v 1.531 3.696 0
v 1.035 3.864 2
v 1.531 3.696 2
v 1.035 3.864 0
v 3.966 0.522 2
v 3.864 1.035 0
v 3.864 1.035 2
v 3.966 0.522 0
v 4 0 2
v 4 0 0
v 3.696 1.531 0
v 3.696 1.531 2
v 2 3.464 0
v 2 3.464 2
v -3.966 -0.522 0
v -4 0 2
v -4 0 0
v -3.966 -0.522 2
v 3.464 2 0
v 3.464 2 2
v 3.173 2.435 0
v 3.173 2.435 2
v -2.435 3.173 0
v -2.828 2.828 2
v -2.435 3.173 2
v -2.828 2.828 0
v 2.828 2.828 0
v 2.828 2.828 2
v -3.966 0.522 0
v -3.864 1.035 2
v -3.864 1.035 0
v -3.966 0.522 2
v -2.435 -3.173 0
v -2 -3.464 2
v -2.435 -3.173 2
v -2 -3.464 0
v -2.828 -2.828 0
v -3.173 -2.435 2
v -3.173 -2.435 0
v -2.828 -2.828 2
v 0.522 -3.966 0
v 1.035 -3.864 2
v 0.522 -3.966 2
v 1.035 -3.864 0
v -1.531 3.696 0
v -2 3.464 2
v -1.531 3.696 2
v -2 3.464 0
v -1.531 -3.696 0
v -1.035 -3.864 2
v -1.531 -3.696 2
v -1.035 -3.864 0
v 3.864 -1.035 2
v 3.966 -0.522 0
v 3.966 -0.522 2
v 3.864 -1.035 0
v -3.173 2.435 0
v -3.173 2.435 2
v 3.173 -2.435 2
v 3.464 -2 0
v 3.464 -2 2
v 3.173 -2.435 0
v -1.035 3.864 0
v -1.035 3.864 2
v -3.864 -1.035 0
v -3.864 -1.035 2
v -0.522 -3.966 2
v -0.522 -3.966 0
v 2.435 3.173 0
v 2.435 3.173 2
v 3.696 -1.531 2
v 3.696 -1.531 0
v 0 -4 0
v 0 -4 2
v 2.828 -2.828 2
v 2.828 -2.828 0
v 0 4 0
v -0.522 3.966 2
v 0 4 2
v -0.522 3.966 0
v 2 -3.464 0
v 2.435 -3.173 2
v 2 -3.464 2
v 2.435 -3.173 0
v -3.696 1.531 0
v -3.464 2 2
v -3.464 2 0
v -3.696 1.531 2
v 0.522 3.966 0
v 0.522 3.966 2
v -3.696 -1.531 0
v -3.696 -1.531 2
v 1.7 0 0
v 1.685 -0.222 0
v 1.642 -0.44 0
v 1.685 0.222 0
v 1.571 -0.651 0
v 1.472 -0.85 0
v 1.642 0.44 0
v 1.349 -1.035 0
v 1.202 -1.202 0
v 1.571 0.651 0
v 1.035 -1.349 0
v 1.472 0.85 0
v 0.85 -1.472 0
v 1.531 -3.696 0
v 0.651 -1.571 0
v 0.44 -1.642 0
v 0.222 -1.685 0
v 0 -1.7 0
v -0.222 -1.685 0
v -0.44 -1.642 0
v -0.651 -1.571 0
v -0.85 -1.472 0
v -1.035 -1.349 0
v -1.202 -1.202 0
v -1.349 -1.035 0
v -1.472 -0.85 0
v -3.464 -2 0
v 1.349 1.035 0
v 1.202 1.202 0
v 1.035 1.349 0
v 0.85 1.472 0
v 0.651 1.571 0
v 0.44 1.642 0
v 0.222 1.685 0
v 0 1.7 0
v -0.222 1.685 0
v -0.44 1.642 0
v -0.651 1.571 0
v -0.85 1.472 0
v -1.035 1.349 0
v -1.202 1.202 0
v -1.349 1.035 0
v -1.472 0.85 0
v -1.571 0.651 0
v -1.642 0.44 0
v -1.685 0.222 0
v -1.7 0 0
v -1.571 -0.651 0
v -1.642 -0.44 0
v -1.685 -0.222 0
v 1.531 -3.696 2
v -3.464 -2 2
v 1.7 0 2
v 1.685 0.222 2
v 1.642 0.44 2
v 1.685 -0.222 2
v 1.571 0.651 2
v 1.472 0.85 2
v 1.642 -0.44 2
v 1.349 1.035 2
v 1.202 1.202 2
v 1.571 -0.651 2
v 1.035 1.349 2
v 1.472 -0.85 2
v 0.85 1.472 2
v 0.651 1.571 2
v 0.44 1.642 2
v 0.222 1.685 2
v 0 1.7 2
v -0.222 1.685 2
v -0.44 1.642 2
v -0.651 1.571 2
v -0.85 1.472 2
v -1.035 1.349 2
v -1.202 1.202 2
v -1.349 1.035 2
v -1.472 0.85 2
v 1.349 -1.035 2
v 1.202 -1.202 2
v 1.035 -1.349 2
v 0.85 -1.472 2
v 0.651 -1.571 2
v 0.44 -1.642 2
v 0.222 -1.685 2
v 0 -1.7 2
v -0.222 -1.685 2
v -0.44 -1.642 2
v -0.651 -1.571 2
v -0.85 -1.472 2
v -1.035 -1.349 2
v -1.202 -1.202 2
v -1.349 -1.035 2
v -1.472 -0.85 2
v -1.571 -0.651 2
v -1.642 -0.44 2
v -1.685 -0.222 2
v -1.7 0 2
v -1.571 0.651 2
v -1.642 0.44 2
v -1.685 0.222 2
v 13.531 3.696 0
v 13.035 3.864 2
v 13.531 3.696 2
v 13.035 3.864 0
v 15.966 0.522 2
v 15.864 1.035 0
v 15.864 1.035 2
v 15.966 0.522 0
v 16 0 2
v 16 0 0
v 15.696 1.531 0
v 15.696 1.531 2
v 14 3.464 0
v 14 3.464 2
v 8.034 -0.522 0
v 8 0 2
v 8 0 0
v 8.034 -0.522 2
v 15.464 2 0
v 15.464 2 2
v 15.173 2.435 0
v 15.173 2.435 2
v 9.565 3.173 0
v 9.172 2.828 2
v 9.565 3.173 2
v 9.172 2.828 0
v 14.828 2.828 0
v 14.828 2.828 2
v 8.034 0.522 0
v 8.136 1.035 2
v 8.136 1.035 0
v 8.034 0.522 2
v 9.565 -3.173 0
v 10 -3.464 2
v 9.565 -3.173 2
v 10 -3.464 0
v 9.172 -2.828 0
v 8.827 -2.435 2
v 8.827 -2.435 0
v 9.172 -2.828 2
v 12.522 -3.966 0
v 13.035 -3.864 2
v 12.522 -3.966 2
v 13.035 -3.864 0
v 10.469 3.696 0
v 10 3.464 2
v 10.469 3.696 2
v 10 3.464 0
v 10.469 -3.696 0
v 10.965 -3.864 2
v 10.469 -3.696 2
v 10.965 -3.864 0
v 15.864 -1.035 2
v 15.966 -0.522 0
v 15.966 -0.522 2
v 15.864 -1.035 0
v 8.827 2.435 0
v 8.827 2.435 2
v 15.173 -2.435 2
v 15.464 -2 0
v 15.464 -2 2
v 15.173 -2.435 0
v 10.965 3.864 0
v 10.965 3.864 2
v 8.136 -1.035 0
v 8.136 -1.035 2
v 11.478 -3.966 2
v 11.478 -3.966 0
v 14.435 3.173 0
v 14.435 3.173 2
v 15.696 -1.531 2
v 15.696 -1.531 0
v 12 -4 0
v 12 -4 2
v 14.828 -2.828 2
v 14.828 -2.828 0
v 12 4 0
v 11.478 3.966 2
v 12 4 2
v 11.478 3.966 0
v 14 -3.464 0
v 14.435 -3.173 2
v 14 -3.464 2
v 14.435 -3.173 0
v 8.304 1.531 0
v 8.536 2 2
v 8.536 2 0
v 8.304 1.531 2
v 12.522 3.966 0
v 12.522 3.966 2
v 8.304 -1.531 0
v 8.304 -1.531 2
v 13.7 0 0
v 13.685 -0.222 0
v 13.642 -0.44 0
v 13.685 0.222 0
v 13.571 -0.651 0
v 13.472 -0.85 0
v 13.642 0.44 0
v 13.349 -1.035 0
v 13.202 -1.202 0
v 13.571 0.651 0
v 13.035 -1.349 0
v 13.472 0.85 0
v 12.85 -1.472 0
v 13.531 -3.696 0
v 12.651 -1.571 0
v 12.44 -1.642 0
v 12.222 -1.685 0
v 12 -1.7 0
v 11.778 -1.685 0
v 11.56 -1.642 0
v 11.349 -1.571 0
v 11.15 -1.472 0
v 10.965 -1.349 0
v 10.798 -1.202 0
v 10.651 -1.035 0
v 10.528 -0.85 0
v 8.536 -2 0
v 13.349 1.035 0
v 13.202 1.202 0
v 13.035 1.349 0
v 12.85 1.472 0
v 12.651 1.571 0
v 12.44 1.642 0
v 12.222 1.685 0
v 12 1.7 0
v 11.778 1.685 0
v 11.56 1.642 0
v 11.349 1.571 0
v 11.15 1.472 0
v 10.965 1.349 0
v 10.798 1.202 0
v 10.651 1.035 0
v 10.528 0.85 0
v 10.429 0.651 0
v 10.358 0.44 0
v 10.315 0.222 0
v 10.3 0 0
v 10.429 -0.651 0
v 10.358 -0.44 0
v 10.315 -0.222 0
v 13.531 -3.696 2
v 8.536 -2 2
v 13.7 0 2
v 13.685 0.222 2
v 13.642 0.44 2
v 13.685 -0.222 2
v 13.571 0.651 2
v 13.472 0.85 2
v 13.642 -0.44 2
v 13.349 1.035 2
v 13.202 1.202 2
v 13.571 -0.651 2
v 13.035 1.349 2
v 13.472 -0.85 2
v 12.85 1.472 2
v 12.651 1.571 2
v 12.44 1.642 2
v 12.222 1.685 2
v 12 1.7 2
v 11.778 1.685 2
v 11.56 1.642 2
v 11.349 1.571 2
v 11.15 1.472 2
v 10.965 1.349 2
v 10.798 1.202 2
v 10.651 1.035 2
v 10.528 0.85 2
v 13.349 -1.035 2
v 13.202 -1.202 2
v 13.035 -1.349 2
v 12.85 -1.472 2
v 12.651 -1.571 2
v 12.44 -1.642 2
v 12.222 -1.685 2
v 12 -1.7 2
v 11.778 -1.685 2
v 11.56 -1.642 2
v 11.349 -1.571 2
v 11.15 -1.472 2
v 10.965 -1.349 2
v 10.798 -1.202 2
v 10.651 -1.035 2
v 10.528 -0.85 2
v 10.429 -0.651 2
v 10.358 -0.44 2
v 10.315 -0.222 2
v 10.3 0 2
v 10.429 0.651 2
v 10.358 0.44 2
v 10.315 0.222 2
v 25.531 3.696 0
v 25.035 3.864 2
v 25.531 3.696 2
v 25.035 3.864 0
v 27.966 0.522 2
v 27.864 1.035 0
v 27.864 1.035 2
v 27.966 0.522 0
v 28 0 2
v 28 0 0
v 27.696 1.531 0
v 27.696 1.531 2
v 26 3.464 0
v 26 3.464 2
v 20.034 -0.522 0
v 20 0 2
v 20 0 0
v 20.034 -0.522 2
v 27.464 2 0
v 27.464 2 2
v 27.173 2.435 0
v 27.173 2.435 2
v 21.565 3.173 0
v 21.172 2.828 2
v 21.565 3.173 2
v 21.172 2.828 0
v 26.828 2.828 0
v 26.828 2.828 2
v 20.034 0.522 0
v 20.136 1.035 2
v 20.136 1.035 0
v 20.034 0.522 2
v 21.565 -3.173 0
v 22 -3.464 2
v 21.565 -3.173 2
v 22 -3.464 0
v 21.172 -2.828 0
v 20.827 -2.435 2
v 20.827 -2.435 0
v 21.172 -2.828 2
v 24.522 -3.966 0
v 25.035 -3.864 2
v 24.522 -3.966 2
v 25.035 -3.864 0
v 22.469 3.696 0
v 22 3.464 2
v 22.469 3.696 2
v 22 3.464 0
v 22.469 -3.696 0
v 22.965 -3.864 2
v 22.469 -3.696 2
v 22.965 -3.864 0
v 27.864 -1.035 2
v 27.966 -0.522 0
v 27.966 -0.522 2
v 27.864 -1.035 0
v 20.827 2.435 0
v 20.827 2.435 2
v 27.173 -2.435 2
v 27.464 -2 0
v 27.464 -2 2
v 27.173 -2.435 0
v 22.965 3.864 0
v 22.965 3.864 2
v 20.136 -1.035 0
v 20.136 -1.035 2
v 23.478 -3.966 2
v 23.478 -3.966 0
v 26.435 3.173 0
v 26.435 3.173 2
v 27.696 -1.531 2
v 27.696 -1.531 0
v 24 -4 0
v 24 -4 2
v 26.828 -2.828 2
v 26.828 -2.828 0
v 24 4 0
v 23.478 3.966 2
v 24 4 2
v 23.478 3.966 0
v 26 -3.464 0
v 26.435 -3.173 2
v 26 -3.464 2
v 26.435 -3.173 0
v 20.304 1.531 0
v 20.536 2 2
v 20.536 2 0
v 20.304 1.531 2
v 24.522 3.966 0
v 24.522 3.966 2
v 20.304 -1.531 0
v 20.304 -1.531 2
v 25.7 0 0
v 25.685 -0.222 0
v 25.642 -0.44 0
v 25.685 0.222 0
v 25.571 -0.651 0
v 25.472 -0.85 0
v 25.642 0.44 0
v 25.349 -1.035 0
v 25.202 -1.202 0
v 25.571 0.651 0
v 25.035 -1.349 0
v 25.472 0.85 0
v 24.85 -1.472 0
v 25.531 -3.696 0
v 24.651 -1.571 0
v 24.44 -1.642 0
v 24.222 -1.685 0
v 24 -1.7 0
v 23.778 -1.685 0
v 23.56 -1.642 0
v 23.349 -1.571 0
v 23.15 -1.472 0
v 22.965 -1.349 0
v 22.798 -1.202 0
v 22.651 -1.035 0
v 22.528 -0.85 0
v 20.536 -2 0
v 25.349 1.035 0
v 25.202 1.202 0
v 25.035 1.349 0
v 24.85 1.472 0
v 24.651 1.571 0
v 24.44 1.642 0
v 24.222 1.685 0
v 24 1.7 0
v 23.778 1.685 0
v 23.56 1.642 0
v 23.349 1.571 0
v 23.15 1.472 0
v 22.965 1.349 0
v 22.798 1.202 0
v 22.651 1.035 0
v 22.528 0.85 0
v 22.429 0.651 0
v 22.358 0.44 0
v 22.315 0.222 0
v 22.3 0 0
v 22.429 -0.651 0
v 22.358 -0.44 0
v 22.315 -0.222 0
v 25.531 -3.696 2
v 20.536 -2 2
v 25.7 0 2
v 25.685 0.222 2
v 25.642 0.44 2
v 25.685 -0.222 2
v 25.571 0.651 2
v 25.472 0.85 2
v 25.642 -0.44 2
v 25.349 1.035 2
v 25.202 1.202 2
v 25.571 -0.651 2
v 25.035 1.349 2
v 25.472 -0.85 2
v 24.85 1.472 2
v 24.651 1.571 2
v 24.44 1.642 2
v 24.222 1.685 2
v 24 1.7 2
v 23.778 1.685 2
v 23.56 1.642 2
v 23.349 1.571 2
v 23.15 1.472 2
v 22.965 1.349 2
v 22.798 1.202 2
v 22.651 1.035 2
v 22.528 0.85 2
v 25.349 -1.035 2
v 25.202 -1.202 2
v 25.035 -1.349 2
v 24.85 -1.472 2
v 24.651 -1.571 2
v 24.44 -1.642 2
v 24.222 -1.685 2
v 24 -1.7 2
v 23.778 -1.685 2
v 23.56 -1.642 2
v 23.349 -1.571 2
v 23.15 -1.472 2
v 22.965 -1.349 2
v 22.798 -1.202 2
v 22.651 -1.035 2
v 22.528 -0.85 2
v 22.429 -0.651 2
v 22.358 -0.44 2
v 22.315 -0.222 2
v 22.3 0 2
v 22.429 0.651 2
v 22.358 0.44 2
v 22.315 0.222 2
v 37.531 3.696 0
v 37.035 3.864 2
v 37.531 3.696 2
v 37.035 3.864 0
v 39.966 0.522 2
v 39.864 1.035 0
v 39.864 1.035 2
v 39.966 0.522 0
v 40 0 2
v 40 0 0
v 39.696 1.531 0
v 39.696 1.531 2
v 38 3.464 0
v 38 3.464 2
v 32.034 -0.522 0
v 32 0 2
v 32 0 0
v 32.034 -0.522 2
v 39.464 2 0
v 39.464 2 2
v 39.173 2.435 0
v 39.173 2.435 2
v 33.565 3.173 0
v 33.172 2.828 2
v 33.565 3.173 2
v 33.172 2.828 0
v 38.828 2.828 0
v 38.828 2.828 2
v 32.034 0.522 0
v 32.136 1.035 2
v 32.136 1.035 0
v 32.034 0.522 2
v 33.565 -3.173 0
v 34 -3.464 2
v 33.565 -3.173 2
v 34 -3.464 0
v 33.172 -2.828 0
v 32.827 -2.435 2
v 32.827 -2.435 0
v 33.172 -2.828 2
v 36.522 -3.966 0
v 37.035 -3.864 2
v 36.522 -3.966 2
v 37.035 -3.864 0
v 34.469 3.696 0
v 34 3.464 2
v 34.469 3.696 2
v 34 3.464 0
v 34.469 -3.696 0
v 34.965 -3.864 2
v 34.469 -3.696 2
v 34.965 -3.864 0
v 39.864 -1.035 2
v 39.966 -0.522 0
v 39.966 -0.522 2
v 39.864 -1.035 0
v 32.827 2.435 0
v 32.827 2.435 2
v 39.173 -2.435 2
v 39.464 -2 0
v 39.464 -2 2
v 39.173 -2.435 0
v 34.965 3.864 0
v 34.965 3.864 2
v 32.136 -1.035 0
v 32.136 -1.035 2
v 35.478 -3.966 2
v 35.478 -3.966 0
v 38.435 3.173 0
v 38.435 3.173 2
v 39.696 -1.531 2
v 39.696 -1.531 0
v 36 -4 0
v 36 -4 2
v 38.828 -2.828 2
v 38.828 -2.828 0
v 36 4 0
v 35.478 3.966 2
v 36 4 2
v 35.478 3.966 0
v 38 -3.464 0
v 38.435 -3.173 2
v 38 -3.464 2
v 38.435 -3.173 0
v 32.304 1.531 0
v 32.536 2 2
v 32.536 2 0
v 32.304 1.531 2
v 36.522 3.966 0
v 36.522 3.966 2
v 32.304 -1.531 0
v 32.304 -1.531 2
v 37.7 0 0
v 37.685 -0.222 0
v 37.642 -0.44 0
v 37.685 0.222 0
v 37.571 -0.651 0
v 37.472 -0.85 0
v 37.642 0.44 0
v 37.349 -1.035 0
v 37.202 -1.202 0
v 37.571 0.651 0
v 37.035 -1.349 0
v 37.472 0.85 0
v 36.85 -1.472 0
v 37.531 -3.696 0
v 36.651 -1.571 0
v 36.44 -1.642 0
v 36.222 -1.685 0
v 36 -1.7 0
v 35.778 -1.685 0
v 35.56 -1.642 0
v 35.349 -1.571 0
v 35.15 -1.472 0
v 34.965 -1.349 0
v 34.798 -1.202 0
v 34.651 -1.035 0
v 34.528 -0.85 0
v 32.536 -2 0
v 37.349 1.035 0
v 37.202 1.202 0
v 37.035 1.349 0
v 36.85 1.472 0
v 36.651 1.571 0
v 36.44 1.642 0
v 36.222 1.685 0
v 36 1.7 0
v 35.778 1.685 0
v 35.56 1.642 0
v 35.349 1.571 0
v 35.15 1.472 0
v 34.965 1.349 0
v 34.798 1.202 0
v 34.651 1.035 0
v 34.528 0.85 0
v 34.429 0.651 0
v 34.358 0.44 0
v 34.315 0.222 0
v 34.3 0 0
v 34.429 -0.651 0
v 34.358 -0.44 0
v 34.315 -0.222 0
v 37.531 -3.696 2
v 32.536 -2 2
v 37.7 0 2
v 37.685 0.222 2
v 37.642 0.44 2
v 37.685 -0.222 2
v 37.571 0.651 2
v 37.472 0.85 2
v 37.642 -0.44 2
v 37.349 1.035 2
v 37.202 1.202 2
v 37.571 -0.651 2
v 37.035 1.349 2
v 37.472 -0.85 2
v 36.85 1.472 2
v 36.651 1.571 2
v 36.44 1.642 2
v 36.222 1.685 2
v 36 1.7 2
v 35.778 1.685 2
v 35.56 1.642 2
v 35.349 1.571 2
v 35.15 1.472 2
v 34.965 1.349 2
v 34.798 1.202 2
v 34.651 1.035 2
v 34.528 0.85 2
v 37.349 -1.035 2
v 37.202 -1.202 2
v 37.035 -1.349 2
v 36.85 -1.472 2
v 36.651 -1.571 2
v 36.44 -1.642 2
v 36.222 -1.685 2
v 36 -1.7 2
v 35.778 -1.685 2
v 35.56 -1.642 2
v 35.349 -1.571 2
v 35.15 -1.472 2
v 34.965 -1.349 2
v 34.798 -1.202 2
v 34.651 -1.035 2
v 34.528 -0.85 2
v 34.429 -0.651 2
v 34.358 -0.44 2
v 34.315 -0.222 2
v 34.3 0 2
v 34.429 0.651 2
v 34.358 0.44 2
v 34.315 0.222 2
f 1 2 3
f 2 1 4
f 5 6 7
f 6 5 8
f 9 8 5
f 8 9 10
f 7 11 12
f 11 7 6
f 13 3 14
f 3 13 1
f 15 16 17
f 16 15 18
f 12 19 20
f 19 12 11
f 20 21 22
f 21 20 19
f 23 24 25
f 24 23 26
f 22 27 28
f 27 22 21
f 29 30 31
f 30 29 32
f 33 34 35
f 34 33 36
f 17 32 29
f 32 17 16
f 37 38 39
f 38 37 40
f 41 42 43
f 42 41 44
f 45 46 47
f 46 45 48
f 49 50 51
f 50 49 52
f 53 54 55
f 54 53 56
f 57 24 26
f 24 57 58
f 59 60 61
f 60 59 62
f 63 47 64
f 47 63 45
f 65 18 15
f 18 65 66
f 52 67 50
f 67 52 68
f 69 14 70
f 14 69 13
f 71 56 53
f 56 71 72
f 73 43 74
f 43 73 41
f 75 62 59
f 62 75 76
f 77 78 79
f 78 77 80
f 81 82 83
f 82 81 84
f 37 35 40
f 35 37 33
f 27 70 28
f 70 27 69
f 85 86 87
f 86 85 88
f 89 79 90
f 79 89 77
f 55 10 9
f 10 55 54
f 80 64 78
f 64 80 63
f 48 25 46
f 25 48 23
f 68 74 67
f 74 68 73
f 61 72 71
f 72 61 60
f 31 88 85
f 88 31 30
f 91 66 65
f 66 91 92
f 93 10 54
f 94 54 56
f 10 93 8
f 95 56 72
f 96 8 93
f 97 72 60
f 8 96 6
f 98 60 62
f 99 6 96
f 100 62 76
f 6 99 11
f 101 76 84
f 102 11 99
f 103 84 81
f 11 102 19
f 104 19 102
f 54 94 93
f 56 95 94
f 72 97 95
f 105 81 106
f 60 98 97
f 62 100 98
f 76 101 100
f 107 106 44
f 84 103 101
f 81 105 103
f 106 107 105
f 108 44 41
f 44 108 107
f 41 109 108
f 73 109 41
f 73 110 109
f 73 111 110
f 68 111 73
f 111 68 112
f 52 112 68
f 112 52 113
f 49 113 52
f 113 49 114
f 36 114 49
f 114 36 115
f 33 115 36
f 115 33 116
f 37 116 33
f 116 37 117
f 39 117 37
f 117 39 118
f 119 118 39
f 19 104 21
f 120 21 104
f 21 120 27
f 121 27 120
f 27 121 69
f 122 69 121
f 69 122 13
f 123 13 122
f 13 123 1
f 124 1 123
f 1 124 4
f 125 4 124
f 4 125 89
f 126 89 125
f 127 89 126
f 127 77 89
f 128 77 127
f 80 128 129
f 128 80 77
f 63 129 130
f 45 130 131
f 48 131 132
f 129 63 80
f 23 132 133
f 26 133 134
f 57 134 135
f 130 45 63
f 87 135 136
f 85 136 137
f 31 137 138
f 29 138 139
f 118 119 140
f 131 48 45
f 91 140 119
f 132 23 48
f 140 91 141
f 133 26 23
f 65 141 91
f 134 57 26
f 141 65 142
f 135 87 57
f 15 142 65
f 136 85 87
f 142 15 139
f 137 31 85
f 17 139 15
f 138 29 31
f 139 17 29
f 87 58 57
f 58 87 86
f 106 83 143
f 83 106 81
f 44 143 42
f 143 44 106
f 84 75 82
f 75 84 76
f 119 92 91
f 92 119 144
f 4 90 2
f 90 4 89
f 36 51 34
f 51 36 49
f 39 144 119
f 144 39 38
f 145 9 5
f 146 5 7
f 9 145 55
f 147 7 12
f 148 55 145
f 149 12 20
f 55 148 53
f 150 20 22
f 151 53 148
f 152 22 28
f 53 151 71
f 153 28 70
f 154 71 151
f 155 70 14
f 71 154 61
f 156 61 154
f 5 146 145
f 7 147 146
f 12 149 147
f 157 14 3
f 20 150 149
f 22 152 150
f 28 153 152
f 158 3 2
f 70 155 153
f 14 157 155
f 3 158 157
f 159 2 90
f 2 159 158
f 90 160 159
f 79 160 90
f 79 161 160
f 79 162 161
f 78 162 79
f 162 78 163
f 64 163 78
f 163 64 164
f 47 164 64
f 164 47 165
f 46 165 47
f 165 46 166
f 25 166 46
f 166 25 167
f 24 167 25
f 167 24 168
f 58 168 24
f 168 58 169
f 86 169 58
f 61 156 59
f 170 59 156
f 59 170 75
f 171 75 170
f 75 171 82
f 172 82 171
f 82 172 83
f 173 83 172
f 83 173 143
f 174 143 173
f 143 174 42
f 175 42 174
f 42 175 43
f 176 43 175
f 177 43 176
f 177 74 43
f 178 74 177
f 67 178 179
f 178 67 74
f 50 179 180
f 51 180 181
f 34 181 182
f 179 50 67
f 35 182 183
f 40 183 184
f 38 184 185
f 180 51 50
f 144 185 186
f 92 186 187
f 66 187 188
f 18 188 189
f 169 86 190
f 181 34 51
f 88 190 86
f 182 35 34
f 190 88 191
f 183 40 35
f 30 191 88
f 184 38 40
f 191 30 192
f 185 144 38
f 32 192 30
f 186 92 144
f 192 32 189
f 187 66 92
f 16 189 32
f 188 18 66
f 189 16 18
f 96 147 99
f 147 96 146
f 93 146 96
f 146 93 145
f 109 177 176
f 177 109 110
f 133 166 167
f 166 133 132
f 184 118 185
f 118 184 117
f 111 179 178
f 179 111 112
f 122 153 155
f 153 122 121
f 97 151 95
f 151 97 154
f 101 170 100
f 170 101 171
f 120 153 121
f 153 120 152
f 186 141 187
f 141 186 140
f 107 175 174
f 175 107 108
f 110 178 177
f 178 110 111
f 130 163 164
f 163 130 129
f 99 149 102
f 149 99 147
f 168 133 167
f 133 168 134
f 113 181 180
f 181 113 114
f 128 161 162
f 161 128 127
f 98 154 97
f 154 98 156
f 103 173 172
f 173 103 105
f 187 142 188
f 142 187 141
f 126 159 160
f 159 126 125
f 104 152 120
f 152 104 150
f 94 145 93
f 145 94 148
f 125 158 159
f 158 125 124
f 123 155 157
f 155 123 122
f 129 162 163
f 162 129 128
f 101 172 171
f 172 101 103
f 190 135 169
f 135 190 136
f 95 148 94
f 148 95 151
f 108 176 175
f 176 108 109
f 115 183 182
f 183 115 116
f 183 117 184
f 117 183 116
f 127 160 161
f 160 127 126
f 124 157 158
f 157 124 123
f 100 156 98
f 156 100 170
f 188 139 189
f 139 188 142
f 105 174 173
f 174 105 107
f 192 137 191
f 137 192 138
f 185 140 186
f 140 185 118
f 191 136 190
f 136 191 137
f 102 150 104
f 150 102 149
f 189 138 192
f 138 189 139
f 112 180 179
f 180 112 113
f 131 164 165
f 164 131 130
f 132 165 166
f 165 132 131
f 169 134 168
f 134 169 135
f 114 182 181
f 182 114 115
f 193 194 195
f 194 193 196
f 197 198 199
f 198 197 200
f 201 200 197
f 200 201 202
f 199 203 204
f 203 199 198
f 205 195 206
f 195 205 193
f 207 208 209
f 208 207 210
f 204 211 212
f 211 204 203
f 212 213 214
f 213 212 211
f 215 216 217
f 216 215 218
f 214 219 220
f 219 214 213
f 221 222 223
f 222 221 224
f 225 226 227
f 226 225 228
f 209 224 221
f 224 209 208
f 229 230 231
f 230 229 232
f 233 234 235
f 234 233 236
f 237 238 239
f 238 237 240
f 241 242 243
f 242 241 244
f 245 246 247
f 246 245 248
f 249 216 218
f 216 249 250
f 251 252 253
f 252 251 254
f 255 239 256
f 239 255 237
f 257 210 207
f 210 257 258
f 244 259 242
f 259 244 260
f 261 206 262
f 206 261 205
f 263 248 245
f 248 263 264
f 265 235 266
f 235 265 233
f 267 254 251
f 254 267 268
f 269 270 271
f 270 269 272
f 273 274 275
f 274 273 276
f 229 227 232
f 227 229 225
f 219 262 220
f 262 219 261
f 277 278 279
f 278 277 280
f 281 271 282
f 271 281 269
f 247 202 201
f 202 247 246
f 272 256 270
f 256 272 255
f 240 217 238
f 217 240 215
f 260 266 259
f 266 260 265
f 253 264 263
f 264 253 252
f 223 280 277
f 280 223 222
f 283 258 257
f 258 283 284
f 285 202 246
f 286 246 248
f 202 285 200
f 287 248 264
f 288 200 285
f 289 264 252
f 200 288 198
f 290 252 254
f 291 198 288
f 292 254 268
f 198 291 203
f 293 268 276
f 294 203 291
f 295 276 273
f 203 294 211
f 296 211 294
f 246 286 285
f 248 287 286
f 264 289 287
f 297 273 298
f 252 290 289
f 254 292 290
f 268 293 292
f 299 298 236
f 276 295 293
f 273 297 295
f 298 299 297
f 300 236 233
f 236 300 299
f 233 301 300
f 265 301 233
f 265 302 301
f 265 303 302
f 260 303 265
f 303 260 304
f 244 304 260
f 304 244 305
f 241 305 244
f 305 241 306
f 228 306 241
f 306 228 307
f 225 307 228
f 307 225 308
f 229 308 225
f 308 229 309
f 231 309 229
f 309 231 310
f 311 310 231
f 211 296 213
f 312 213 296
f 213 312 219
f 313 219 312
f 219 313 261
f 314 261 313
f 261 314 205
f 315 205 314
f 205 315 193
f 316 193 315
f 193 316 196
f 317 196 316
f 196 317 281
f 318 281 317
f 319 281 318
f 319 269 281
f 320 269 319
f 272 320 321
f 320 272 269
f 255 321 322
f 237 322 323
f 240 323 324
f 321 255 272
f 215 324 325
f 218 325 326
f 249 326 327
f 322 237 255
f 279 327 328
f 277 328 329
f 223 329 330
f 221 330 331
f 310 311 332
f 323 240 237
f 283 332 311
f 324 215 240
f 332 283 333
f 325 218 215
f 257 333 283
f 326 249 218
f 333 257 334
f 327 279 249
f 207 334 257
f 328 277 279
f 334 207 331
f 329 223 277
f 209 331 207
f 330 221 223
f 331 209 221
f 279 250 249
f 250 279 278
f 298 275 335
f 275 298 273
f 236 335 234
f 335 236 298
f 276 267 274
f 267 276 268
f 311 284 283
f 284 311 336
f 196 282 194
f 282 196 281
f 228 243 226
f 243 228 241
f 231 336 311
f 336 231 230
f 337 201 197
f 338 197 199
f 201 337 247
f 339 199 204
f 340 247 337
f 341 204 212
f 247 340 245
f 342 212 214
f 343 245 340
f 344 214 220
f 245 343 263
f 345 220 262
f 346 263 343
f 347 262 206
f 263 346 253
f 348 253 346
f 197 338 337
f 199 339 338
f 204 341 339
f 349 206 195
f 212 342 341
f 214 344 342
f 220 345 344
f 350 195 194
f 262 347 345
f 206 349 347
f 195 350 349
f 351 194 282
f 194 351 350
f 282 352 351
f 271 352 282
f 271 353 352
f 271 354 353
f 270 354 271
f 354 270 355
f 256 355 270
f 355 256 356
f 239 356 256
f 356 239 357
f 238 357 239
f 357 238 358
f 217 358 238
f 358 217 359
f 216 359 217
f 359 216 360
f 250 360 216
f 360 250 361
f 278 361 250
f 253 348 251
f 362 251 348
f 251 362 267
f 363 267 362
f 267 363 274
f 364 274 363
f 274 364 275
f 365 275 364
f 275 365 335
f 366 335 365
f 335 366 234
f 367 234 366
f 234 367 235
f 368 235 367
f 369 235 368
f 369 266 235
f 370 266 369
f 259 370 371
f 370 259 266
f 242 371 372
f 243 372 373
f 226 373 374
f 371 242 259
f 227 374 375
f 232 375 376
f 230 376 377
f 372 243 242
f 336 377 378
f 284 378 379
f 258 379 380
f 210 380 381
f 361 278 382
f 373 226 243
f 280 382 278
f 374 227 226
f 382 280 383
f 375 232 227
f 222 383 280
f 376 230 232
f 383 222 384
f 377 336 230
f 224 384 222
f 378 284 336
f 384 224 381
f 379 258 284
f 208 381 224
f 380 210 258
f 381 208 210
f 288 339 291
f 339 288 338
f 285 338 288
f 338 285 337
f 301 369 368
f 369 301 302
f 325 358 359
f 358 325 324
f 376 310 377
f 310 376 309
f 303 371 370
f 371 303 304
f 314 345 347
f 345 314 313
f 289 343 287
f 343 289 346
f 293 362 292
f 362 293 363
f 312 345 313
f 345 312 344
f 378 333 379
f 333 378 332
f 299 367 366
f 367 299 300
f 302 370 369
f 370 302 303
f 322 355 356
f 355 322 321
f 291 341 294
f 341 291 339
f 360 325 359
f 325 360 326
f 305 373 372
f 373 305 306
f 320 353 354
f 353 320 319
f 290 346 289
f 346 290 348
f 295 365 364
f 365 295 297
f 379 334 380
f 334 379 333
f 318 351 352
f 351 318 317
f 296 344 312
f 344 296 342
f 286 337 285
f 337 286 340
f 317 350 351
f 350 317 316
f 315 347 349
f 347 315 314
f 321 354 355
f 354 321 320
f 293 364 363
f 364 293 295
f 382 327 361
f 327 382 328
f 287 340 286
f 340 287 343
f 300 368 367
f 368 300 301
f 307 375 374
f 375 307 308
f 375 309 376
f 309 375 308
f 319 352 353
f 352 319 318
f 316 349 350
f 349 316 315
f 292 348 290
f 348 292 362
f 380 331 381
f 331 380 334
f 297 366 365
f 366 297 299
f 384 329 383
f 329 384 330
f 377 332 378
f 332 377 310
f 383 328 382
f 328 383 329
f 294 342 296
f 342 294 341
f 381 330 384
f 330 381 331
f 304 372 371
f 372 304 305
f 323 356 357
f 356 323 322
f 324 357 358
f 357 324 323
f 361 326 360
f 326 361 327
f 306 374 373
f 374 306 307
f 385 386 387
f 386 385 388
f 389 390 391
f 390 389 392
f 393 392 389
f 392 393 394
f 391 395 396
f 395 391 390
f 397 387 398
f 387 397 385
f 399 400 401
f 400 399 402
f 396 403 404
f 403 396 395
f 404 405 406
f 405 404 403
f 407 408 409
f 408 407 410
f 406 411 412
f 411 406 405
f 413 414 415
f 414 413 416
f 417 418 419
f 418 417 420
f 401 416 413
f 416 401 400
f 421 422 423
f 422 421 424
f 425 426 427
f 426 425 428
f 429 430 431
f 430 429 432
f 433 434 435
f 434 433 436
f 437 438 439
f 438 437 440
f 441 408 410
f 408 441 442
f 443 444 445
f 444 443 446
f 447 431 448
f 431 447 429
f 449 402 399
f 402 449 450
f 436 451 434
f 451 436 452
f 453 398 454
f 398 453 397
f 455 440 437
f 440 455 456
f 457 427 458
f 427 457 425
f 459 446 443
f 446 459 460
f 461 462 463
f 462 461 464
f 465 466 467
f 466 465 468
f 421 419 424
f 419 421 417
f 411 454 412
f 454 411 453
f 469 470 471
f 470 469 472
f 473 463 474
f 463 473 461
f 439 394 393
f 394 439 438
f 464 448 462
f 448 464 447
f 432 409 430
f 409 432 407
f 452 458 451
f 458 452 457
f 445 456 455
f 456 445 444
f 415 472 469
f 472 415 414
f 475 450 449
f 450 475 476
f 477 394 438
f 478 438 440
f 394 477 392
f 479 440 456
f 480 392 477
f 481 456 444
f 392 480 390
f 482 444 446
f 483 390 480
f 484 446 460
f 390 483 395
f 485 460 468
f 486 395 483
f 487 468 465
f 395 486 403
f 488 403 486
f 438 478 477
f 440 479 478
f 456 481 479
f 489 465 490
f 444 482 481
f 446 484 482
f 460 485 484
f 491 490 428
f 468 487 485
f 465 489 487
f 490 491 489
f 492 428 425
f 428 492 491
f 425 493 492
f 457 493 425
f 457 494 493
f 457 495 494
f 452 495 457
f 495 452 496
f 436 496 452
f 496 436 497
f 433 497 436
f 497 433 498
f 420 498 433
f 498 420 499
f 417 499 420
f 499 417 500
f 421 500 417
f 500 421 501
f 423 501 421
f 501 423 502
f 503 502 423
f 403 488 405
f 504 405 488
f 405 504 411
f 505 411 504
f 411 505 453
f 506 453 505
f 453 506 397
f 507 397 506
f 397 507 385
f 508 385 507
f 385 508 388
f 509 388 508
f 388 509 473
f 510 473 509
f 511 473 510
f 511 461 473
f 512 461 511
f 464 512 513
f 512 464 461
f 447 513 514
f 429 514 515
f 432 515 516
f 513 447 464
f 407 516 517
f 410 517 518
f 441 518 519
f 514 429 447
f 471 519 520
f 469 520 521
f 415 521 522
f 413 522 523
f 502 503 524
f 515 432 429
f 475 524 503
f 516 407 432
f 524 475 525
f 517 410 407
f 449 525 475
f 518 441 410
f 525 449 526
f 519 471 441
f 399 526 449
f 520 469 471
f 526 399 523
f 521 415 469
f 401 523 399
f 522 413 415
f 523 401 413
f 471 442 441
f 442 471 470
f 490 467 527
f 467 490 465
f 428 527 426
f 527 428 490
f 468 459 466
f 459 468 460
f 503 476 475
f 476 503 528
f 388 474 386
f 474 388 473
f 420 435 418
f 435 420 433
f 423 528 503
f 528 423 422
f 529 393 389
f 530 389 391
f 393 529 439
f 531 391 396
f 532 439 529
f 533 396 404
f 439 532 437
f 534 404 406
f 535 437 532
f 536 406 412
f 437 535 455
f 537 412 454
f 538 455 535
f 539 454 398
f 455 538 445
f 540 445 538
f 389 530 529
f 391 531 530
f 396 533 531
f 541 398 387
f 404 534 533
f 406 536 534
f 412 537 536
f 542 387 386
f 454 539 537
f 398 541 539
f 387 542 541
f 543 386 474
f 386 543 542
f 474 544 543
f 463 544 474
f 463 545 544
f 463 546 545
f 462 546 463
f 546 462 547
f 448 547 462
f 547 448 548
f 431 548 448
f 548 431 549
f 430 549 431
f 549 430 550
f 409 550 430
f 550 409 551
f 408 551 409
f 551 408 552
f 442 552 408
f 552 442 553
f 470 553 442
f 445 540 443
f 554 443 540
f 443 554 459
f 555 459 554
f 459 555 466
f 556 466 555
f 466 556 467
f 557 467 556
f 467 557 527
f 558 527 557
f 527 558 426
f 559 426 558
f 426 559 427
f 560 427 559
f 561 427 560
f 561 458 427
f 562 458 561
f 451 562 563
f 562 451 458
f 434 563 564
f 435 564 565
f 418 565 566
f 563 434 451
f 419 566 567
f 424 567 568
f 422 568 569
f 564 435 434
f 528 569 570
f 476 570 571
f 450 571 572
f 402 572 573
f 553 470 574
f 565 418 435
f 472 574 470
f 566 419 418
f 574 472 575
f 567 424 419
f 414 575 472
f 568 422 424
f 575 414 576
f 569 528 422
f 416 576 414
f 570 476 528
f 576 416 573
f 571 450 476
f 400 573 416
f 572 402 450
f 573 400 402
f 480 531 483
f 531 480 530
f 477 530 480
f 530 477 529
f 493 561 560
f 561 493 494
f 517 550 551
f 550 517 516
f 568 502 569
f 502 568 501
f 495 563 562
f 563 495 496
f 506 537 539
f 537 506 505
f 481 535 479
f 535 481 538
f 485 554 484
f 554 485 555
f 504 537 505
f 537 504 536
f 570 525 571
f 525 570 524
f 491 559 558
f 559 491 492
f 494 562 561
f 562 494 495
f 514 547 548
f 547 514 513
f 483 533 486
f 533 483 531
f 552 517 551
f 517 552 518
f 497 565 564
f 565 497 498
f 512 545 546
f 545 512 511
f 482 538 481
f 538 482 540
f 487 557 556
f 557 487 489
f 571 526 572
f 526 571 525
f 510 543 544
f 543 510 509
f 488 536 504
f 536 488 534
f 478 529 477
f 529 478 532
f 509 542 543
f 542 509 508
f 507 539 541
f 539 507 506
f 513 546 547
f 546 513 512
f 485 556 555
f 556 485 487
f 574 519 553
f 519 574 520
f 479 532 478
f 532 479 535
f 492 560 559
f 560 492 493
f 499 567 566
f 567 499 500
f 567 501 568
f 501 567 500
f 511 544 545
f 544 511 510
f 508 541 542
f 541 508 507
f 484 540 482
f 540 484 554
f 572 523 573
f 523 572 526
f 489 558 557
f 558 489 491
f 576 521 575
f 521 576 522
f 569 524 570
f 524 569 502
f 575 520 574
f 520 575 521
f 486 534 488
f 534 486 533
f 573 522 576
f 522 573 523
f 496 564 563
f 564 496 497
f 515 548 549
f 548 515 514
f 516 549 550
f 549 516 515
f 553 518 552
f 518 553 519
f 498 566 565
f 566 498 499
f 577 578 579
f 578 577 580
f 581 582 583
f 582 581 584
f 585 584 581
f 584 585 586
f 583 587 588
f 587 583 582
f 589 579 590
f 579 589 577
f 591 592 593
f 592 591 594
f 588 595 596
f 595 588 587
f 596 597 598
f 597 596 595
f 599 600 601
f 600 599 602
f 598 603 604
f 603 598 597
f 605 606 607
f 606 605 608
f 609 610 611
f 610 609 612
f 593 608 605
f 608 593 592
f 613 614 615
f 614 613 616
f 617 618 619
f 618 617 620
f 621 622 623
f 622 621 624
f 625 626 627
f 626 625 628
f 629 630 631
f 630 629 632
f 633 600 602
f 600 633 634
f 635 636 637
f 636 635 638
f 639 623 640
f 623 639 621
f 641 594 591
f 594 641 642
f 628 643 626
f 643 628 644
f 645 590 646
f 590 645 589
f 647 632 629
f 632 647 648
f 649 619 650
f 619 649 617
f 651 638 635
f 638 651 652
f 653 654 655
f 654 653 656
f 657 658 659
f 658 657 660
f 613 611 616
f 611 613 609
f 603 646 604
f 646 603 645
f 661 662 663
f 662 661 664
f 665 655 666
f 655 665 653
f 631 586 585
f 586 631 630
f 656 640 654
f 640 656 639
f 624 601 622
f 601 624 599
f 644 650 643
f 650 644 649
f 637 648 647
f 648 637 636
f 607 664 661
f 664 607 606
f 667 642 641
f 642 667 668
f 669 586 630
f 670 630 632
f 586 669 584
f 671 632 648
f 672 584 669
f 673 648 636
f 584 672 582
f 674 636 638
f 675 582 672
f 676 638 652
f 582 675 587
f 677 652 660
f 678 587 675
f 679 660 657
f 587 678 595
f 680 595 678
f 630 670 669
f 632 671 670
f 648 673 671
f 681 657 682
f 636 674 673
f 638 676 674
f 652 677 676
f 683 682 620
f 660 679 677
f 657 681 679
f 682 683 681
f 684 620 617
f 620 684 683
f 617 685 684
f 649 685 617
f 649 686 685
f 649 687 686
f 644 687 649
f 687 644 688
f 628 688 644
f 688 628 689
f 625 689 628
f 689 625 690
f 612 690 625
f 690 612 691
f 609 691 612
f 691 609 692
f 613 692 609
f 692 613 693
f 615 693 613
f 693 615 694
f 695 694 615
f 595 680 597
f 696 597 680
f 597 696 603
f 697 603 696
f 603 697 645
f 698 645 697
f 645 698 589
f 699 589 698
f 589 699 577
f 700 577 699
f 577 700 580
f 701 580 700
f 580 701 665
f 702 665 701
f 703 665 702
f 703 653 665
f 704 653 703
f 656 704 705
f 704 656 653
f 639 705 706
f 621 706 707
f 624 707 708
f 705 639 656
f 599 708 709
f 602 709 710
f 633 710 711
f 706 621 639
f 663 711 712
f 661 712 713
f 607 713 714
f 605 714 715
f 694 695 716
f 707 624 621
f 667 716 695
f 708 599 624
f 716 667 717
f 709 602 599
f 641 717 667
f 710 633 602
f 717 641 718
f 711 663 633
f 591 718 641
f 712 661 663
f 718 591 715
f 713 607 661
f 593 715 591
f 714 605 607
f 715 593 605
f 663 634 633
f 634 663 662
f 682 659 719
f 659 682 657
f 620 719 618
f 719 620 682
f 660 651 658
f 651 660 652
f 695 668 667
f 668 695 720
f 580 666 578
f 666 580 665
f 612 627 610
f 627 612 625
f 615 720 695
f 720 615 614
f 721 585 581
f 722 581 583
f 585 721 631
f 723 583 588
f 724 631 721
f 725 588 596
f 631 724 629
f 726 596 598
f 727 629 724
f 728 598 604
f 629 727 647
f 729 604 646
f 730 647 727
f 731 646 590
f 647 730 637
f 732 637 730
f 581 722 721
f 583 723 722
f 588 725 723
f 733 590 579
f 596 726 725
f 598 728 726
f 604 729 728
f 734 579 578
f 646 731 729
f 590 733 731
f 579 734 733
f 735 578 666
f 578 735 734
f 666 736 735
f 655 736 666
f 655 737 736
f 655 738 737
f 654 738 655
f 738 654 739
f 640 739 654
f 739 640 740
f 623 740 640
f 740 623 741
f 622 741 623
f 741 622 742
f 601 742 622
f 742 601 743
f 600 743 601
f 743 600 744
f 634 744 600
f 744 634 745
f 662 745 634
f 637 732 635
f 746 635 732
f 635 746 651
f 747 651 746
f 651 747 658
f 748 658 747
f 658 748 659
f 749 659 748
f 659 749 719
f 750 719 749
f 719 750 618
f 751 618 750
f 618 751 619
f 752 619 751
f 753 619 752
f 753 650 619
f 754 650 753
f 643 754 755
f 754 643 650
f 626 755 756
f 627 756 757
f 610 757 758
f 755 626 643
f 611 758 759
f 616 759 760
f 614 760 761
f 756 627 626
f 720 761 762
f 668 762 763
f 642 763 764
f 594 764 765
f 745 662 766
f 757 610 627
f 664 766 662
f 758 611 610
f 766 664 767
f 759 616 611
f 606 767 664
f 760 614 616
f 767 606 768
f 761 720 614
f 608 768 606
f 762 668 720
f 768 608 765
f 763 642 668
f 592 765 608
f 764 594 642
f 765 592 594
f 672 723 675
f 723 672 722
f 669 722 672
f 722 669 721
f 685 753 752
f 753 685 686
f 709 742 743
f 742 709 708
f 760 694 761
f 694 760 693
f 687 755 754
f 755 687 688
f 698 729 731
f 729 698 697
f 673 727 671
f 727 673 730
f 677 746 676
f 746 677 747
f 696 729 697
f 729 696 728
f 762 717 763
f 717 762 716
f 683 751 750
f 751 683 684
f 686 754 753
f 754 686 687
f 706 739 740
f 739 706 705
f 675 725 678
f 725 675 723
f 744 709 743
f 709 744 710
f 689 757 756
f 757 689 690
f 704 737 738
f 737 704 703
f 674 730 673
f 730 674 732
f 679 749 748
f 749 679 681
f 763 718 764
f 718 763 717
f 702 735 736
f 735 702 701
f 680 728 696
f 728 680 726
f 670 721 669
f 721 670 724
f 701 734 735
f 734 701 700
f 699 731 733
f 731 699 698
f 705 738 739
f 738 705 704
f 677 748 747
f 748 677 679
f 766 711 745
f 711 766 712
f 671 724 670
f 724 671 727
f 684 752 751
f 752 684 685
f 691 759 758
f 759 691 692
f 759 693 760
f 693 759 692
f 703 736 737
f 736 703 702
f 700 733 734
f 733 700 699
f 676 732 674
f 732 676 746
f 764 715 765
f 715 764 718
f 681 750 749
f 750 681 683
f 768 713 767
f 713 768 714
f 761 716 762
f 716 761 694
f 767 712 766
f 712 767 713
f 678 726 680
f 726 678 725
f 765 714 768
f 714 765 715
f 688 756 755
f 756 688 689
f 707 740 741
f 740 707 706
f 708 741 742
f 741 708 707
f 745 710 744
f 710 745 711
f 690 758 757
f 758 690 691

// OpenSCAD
// M3 washer / spacer - 2mm thick x4
$fn = 48;
od = 8;
id = 3.4;
h  = 2;

for (i = [0:3])
    translate([i * 12, 0, 0])
        difference() {
            cylinder(d=od, h=h);
            cylinder(d=id, h=h);
        }
